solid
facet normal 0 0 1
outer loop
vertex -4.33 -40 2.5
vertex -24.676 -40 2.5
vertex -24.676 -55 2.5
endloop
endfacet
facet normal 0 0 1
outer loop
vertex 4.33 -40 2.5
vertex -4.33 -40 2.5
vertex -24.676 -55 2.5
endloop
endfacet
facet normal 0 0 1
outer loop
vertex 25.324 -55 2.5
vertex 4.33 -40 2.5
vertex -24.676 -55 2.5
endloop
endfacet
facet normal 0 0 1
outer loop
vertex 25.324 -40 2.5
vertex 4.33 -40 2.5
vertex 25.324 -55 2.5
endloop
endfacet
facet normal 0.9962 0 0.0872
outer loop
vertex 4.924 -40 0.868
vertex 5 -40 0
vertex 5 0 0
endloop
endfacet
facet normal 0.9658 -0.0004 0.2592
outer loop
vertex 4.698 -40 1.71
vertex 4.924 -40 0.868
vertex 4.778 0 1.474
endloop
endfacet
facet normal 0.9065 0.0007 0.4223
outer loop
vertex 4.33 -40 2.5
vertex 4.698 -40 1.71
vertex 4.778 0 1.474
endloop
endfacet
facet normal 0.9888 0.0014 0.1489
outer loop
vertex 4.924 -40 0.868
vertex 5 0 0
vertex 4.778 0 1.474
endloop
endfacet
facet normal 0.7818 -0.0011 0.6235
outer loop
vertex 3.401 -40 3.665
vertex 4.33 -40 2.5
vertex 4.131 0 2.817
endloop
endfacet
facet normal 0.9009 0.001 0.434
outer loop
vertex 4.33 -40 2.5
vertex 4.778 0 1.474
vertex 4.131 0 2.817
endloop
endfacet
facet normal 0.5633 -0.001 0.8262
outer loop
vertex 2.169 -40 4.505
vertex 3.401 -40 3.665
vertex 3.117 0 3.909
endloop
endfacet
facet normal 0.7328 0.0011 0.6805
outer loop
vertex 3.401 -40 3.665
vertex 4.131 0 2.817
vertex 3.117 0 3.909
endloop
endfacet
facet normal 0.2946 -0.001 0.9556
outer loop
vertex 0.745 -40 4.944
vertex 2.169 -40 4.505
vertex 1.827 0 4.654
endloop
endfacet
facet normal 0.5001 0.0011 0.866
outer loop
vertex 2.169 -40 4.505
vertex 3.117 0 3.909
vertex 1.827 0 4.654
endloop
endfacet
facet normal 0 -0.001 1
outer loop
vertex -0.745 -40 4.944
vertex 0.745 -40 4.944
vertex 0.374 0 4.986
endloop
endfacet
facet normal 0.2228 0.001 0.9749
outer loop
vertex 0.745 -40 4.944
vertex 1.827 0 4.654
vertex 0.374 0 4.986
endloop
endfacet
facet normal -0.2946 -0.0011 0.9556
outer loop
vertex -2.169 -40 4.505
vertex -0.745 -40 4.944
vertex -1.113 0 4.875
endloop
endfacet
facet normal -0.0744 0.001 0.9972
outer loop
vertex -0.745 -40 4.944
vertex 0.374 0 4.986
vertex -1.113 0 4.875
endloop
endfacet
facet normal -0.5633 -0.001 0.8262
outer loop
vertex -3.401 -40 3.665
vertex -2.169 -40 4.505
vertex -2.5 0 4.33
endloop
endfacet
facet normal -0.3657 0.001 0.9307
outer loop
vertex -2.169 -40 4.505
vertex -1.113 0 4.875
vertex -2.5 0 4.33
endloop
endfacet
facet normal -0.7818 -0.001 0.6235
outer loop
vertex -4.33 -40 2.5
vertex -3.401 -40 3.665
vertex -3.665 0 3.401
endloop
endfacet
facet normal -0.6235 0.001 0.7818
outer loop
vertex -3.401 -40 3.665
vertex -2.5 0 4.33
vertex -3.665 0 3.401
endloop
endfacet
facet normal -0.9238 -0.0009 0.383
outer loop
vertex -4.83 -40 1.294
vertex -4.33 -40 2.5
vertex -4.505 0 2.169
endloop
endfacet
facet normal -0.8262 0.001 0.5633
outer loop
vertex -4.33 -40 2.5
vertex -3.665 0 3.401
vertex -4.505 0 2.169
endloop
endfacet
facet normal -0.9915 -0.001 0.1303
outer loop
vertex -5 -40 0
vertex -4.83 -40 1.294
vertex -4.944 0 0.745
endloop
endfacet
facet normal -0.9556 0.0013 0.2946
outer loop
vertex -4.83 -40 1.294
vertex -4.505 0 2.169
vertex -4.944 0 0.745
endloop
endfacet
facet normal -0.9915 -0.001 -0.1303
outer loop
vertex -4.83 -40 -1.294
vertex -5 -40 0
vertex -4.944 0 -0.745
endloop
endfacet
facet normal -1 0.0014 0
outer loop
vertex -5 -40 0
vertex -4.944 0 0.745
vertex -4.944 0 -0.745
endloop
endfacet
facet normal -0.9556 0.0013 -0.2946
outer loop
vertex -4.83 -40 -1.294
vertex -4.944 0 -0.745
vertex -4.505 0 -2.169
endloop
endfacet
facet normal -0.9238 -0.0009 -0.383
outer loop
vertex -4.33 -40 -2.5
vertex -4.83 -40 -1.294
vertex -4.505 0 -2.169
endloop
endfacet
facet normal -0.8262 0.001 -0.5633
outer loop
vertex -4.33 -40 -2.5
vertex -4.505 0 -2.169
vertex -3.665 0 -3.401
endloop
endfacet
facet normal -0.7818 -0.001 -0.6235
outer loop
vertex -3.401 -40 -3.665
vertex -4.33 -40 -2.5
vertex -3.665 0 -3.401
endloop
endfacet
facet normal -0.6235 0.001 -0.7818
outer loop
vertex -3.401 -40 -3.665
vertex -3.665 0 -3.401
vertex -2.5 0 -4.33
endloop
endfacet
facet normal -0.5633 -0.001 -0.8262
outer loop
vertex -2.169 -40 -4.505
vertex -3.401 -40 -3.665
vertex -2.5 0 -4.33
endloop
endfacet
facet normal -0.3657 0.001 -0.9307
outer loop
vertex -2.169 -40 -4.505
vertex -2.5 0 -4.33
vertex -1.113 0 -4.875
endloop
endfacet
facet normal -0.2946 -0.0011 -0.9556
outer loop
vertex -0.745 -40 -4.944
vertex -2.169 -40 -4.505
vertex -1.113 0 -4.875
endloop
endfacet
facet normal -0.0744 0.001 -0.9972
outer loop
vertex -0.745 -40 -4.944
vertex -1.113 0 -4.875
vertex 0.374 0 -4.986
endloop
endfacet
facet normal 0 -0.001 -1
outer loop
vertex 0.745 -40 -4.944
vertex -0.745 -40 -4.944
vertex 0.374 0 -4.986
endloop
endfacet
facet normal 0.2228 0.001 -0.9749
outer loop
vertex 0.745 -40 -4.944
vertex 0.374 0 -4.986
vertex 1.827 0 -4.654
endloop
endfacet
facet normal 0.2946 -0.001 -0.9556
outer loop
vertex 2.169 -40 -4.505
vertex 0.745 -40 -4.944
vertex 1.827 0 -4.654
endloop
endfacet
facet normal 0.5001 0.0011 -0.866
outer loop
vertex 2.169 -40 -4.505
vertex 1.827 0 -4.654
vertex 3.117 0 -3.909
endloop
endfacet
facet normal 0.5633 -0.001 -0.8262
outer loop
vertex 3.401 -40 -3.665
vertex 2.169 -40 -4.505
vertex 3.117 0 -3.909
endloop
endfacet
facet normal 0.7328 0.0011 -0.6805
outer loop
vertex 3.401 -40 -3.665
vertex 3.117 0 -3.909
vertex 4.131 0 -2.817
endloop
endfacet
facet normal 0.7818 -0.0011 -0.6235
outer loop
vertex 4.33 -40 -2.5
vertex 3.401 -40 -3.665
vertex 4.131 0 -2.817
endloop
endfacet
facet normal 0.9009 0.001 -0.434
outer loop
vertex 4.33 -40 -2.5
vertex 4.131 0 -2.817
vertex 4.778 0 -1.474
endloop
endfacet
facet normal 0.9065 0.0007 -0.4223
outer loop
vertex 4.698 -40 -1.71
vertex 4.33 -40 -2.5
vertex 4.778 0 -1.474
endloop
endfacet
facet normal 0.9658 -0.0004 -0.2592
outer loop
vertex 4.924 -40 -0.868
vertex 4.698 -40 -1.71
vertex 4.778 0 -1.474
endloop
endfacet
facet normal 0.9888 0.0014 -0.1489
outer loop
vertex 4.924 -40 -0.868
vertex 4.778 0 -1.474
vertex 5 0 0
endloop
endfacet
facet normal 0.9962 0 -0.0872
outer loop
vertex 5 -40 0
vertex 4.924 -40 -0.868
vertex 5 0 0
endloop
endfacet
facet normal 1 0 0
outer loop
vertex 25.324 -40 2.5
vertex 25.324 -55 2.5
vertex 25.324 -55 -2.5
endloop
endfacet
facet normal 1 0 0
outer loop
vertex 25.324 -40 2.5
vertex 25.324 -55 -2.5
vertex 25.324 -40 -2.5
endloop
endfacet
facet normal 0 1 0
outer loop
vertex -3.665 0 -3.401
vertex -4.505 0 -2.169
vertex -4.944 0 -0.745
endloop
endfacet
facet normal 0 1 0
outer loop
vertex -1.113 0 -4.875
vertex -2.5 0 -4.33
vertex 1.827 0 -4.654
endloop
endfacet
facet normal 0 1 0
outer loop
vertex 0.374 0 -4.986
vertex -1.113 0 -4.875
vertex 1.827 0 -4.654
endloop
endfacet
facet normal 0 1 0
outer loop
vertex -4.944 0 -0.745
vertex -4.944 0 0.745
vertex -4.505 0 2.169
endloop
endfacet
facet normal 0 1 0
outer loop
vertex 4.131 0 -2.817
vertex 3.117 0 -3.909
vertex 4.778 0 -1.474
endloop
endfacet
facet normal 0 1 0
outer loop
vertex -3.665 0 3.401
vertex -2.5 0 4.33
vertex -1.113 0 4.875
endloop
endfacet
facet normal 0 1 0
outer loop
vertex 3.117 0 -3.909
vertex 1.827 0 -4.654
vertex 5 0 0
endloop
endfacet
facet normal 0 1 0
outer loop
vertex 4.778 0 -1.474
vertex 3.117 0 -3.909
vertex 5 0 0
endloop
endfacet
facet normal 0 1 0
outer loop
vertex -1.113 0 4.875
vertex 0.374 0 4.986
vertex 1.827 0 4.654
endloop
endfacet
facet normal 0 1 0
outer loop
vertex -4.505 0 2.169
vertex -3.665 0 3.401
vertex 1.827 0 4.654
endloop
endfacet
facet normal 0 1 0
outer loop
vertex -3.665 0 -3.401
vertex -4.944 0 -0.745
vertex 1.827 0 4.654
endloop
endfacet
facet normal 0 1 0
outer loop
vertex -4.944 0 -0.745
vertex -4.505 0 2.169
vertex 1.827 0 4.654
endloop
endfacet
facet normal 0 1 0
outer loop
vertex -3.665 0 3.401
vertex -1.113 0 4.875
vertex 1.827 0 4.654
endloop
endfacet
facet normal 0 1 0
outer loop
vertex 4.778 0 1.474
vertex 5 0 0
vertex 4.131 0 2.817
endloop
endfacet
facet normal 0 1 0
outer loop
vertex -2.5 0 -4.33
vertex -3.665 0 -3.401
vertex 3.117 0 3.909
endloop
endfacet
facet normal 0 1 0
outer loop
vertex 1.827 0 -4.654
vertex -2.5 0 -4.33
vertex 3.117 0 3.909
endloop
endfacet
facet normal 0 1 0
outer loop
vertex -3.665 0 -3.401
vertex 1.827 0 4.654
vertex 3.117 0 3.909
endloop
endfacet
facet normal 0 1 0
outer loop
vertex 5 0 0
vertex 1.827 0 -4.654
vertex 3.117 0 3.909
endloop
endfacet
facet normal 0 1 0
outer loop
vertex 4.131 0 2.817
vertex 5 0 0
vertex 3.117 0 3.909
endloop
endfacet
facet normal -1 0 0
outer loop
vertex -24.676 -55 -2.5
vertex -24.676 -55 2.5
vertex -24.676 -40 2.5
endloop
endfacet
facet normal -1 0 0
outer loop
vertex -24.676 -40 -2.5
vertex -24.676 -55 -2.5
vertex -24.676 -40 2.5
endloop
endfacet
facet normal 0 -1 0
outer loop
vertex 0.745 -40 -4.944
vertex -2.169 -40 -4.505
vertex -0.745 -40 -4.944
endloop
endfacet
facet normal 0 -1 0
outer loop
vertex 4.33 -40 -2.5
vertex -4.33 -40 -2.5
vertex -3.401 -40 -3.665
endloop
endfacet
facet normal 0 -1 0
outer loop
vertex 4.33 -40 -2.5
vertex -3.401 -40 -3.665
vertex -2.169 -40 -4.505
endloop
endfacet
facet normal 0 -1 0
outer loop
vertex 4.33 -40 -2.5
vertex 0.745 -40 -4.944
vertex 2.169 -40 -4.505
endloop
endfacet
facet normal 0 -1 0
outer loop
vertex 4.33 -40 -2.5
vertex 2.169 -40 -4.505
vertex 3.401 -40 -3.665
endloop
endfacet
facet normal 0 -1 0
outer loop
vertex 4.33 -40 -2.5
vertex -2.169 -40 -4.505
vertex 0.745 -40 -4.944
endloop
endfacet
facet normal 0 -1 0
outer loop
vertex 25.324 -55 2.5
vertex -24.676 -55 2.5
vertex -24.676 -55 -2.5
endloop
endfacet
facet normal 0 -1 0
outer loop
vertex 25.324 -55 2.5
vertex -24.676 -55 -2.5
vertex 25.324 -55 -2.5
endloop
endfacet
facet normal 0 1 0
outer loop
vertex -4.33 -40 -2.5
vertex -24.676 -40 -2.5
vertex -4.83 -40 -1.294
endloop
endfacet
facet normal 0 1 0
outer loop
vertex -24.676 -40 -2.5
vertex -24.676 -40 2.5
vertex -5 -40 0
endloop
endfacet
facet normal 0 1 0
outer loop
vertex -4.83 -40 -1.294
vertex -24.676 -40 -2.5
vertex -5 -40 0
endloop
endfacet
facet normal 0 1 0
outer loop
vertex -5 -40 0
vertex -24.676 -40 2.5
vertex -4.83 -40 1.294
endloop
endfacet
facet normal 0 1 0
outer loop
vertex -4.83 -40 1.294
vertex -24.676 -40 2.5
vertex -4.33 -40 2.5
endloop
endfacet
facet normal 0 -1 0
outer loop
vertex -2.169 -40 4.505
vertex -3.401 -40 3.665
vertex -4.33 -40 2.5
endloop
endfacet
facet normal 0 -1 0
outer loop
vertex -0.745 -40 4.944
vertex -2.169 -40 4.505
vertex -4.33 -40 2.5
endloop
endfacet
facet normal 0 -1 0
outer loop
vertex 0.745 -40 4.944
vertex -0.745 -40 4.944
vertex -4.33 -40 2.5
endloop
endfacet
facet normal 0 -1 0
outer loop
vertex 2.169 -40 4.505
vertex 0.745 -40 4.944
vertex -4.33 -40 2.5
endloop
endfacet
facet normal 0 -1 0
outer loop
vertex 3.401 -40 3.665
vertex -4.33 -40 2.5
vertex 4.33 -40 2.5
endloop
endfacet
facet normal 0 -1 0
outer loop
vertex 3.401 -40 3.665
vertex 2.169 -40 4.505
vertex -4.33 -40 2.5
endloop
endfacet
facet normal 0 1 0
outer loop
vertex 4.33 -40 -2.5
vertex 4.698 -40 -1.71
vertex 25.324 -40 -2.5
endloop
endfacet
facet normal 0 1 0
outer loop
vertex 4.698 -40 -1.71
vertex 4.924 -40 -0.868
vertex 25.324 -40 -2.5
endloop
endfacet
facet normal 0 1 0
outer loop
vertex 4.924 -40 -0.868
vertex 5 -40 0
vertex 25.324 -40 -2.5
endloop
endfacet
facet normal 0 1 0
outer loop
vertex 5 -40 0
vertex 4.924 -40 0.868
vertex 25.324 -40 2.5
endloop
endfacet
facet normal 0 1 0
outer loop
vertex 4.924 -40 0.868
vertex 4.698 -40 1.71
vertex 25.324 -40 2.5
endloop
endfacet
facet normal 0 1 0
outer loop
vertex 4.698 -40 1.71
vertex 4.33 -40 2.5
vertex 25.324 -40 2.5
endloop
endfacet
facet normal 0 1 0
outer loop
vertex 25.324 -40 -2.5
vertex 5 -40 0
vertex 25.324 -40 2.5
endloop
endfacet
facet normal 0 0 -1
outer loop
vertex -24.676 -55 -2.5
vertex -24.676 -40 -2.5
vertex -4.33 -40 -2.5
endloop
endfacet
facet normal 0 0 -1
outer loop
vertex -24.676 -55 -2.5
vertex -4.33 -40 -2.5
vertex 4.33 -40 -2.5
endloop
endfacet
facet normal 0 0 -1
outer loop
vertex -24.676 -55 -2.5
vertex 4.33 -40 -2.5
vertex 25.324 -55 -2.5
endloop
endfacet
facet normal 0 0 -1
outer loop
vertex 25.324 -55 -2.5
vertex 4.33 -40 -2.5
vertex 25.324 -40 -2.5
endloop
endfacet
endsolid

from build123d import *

# Parameters (mm, degrees)
F0_R     = 5
F1_DEPTH = 40
F2_W     = 50
F2_H     = 15
F3_DEPTH = 2.5


with BuildPart() as f1:
    # F0 (on Front) → F1 (new body)
    with BuildSketch(Plane.XZ):
        Circle(F0_R)
    extrude(amount=F1_DEPTH)

    # F2 (on Top) → F3 (join, symmetric)
    with BuildSketch(Plane.XY):
        with Locations((0.324281, -47.5)):
            Rectangle(F2_W, F2_H)
    extrude(amount=F3_DEPTH, both=True)


solid = f1.part
